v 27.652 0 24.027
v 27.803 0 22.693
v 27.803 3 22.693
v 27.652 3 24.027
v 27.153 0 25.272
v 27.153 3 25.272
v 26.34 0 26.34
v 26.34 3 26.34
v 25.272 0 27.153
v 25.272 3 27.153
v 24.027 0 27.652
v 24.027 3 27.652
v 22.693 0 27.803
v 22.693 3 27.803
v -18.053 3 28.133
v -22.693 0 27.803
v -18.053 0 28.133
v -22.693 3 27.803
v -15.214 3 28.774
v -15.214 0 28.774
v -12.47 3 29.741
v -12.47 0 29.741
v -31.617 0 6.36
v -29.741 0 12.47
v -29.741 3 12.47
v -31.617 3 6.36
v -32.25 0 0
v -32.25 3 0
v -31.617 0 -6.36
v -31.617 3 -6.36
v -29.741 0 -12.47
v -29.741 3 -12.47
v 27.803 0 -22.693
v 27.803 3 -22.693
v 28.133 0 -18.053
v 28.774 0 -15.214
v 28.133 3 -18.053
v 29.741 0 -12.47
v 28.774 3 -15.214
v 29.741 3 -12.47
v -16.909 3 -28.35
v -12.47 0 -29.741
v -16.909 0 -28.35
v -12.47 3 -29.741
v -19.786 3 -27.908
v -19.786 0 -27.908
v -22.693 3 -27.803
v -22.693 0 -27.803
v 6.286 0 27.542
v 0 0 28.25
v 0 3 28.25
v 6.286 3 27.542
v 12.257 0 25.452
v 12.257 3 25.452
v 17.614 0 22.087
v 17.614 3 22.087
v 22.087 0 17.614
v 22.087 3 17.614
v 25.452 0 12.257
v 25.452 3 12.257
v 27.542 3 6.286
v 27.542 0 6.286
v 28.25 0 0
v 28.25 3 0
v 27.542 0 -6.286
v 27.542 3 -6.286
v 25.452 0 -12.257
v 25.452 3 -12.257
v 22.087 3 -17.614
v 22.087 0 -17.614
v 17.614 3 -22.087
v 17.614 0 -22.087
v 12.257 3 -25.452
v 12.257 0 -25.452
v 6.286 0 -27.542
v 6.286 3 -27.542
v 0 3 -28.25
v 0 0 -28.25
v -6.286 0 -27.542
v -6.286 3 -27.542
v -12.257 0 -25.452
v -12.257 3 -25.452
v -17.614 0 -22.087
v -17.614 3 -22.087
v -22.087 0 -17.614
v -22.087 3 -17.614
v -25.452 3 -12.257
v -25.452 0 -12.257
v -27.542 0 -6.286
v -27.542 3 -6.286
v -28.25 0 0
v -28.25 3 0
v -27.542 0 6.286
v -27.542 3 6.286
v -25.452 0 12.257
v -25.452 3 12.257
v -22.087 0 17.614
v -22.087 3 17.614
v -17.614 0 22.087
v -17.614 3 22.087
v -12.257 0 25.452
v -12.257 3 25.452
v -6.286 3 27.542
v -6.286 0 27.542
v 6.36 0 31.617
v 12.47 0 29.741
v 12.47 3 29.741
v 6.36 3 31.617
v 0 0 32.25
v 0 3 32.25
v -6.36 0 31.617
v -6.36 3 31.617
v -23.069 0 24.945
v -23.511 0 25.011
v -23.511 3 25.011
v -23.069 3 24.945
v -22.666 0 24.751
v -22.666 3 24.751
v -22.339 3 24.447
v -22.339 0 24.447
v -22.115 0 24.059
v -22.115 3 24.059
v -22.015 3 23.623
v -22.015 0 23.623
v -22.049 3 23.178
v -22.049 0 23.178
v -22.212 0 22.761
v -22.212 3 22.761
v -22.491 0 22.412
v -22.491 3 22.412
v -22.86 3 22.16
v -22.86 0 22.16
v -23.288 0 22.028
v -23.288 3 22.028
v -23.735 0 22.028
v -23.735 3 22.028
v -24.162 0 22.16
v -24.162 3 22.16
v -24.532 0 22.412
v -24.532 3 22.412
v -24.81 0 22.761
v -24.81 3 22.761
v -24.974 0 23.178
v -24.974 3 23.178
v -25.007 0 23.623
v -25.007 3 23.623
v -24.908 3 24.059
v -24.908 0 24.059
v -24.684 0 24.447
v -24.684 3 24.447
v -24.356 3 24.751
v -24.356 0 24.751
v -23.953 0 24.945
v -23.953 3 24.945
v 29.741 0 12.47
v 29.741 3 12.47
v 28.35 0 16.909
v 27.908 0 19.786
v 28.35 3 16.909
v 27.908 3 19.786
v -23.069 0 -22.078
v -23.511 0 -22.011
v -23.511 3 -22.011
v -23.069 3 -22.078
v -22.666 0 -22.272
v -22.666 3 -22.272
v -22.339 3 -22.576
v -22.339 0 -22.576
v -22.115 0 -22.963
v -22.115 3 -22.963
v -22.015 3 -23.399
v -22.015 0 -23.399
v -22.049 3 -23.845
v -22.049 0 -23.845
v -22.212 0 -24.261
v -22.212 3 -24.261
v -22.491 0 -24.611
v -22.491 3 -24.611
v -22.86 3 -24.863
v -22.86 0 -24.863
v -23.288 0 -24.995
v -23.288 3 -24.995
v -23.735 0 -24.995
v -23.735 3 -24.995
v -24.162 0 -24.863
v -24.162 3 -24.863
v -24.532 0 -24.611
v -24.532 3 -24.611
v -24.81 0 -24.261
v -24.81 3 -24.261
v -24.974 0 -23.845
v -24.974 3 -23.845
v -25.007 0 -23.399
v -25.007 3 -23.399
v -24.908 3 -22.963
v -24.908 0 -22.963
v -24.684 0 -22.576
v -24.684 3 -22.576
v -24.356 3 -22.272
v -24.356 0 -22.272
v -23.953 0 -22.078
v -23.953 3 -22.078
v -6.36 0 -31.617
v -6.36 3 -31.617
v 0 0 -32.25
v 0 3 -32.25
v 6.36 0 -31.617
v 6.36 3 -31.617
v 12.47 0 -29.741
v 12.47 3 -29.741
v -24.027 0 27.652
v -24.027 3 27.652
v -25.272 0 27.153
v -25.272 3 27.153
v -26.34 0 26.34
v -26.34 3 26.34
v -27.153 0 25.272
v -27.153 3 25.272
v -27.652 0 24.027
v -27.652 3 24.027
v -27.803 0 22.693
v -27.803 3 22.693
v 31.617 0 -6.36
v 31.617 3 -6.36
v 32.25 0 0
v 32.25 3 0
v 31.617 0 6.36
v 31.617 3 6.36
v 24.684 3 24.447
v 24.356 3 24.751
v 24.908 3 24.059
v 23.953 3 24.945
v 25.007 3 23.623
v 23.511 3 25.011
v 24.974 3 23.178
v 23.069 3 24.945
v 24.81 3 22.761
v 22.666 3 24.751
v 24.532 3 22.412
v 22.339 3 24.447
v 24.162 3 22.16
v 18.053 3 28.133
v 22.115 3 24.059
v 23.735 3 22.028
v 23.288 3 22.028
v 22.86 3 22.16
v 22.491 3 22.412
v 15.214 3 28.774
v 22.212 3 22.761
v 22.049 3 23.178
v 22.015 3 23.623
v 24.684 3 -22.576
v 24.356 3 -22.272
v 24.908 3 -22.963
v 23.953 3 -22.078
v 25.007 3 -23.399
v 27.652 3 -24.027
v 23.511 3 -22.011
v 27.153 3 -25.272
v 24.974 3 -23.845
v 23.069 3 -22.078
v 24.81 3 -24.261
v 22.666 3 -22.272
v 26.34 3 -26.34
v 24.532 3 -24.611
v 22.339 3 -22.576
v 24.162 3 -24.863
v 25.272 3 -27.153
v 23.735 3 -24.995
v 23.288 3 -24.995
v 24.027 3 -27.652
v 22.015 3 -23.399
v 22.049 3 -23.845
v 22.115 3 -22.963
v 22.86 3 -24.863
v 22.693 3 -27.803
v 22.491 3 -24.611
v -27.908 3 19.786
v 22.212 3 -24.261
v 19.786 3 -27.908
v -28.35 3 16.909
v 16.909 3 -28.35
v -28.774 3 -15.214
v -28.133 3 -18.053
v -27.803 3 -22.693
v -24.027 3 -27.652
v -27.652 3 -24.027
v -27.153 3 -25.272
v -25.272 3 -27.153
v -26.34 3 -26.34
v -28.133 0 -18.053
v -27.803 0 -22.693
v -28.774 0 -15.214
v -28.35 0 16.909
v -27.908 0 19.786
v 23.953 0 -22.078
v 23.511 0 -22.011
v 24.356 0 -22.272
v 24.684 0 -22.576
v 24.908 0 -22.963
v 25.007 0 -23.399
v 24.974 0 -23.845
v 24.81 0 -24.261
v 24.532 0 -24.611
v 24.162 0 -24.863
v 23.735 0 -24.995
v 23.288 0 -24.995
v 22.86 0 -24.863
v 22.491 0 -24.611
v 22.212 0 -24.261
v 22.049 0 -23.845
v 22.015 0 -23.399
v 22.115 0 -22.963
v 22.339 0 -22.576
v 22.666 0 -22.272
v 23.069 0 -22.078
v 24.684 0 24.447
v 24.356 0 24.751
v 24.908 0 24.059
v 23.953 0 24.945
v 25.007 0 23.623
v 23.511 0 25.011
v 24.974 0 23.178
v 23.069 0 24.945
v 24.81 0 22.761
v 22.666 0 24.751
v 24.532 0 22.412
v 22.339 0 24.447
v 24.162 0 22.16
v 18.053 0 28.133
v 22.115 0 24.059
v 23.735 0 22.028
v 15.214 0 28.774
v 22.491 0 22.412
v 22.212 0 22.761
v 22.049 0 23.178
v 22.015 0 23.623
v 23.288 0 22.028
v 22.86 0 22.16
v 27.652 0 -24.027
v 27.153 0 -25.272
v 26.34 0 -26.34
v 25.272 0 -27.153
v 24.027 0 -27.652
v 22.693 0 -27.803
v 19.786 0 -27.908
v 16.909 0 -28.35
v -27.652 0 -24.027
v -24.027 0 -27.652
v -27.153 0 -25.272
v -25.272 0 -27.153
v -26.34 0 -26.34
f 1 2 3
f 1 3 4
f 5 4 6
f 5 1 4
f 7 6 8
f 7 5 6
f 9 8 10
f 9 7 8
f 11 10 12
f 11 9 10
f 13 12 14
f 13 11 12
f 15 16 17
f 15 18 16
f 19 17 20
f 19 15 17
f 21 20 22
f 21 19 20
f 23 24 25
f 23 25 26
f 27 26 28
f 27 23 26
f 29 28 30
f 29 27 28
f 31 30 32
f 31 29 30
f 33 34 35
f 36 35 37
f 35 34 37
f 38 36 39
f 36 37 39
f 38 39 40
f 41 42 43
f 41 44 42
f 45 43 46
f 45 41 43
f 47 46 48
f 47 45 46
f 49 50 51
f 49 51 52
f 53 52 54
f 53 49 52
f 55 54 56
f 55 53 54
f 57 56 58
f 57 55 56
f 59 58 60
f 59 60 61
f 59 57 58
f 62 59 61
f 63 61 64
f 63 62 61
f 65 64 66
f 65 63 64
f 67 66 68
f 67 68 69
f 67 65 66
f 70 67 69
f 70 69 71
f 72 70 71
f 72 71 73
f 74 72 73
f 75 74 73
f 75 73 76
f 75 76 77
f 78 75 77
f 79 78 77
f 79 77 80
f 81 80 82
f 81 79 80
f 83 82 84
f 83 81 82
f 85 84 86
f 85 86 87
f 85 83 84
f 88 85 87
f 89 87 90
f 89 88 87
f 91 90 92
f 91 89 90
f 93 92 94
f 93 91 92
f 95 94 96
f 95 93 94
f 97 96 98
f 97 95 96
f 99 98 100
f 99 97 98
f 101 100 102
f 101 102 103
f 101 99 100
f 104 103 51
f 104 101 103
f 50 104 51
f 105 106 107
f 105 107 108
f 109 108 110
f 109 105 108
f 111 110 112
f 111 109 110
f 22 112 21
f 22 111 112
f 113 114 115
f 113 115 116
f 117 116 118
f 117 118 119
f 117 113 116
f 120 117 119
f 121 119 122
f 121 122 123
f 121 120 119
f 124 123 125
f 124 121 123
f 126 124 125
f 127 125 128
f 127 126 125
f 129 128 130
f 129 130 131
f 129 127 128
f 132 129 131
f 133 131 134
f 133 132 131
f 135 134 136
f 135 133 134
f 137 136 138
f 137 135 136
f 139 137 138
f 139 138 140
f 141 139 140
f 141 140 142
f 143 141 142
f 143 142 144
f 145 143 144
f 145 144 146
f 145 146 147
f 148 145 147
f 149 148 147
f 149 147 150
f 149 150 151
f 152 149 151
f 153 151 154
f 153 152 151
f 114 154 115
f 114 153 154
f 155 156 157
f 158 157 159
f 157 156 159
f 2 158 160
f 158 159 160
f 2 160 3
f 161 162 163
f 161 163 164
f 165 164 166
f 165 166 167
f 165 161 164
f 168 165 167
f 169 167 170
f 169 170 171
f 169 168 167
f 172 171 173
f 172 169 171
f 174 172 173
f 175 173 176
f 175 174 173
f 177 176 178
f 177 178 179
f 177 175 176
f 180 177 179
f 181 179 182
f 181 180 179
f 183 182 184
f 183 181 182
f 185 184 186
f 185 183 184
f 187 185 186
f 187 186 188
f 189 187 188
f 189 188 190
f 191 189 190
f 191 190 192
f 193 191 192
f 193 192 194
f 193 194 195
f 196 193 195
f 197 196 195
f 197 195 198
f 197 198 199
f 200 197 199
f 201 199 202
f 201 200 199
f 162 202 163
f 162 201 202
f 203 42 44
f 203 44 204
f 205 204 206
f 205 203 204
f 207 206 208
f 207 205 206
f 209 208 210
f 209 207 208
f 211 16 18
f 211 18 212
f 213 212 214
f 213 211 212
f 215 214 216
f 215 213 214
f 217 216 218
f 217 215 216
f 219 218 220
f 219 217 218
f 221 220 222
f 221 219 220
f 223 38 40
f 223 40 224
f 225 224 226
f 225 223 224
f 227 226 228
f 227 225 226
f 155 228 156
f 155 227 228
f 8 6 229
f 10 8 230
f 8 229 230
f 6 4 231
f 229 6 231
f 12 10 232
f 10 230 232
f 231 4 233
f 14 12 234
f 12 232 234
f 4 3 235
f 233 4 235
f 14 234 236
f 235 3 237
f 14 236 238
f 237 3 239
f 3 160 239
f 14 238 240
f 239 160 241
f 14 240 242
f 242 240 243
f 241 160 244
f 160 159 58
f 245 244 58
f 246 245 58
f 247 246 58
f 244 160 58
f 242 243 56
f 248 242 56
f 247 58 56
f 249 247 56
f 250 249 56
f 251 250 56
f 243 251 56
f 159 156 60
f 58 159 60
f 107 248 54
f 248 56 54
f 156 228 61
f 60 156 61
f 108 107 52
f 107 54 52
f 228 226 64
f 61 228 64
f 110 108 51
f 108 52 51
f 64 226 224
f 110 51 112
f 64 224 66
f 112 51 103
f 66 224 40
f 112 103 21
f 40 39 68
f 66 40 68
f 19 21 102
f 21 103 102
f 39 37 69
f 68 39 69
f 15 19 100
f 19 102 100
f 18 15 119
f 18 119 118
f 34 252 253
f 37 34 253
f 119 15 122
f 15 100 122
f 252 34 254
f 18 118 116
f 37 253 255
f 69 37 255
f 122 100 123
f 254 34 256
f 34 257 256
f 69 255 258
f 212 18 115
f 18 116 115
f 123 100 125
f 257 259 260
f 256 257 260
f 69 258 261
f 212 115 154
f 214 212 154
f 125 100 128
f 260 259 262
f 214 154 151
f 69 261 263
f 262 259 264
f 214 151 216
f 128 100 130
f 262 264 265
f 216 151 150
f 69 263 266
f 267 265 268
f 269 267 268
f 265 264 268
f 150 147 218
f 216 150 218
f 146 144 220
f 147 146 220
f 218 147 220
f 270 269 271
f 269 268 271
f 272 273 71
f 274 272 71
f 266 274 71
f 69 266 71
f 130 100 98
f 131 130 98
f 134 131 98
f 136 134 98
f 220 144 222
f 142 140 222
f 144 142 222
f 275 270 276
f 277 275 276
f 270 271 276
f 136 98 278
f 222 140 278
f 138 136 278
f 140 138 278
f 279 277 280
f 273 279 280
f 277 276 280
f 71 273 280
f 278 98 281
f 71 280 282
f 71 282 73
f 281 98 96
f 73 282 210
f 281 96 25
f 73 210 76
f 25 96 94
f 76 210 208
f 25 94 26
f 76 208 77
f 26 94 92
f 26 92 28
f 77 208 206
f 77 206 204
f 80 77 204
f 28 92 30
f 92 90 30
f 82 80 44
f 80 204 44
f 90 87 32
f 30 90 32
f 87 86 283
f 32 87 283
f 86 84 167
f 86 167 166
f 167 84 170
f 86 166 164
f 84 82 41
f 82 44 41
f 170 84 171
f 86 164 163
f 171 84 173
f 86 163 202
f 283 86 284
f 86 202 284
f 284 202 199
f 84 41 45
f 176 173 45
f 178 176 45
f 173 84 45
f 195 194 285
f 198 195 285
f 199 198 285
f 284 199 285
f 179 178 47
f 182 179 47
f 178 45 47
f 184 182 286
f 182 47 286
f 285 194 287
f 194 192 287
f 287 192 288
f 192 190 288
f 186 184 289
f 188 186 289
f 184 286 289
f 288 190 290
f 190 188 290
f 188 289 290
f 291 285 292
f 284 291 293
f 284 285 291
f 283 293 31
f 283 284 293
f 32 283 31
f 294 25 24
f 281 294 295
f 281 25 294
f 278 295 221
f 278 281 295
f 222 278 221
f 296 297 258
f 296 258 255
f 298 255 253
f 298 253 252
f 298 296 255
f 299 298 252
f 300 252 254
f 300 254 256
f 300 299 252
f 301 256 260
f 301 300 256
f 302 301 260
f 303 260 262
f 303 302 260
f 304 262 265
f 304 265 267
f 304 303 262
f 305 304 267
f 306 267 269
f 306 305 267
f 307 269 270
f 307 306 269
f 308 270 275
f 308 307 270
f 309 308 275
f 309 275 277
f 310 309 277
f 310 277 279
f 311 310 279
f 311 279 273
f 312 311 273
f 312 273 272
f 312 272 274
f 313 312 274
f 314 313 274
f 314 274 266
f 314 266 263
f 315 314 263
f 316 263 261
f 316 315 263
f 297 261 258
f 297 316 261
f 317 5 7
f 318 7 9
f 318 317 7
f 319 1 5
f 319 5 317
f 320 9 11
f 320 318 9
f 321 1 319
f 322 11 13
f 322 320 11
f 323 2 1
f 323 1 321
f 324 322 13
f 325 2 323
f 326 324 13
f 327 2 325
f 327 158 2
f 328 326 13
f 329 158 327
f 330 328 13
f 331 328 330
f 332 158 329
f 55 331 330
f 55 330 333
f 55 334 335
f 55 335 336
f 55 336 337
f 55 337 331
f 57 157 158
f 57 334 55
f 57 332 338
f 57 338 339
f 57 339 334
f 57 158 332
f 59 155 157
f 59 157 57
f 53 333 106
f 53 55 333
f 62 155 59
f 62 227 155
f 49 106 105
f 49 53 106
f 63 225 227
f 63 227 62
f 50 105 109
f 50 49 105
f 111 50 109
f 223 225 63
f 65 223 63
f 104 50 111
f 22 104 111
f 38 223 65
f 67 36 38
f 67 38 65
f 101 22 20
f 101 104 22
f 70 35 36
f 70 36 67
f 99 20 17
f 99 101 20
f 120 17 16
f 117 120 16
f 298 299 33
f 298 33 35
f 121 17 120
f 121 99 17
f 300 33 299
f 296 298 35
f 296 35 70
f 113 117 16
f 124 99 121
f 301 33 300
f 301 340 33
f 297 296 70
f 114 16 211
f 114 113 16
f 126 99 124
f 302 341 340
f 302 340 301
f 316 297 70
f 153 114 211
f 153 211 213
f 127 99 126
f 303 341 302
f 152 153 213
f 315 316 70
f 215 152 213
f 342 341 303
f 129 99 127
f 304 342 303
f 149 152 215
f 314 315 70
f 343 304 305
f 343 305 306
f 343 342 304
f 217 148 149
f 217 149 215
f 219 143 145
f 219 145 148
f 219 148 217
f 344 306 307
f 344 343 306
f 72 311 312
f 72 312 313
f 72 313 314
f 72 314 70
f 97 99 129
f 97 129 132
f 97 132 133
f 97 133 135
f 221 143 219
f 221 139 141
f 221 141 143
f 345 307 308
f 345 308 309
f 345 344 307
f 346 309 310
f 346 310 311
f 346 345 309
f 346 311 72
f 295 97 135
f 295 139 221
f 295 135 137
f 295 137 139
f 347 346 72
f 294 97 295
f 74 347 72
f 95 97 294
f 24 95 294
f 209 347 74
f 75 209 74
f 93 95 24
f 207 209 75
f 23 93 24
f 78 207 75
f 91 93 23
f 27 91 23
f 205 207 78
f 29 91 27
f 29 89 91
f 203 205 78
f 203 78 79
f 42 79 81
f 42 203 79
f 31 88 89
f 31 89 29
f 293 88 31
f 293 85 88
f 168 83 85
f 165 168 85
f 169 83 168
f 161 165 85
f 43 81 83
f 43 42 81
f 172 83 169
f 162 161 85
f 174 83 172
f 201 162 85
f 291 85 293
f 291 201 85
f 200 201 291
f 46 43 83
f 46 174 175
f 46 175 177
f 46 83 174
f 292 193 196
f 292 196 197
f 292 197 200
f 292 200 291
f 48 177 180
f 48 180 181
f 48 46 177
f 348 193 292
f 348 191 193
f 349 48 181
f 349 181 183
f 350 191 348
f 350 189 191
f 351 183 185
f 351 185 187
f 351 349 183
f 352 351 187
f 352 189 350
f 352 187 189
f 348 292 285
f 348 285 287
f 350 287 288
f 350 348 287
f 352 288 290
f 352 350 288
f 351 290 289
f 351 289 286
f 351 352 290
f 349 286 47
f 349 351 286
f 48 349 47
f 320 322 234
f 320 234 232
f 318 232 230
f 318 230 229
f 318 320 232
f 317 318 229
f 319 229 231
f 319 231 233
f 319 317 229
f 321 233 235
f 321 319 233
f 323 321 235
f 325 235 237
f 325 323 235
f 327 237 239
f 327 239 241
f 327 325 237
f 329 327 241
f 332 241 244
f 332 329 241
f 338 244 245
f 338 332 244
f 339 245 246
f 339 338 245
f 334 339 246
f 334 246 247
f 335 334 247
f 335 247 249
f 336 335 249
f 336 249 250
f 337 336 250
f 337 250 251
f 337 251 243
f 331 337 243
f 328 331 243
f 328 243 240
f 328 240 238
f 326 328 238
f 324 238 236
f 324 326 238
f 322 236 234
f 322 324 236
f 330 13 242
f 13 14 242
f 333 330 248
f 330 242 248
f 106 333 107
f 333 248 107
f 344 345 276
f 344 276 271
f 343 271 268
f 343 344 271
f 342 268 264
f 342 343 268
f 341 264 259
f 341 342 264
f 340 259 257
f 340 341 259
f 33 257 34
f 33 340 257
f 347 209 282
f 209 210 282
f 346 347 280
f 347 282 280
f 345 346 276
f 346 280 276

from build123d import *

# Parameters (mm, degrees)
SKETCH1_R           = 28.25
SKETCH1_R_2         = 1.5
BOSS_EXTRUDE1_DEPTH = 3
FILLET1_R           = 25


with BuildPart() as part:
    # Sketch1 → Boss-Extrude1 (new body)
    with BuildSketch(Plane(origin=(0, 0, 0), x_dir=(1, 0, 0), z_dir=(0, 1, 0))):
        with BuildLine():
            ThreePointArc((-19.00522636, 26.055016235), (0, 32.25), (19.00522636, 26.055016235))
            ThreePointArc((19.00522636, 26.055016235), (26.339727599, 26.339727599), (26.055016235, 19.00522636))
            ThreePointArc((26.055016235, 19.00522636), (32.25, 0), (26.055016235, -19.00522636))
            ThreePointArc((26.055016235, -19.00522636), (26.339727599, -26.339727599), (19.00522636, -26.055016235))
            ThreePointArc((19.00522636, -26.055016235), (0, -32.25), (-19.00522636, -26.055016235))
            ThreePointArc((-19.00522636, -26.055016235), (-26.339727599, -26.339727599), (-26.055016235, -19.00522636))
            ThreePointArc((-26.055016235, -19.00522636), (-32.25, 0), (-26.055016235, 19.00522636))
            ThreePointArc((-26.055016235, 19.00522636), (-26.339727599, 26.339727599), (-19.00522636, 26.055016235))
        make_face()
        with Locations(Location((0, 0, 0), (0, 0, 270))):
            Circle(SKETCH1_R, mode=Mode.SUBTRACT)
        with Locations(Location((23.511300474, 23.511300474, 0), (0, 0, 270))):
            Circle(SKETCH1_R_2, mode=Mode.SUBTRACT)
        with Locations(Location((23.511300474, -23.511300474, 0), (0, 0, 270))):
            Circle(SKETCH1_R_2, mode=Mode.SUBTRACT)
        with Locations(Location((-23.511300474, -23.511300474, 0), (0, 0, 270))):
            Circle(SKETCH1_R_2, mode=Mode.SUBTRACT)
        with Locations(Location((-23.511300474, 23.511300474, 0), (0, 0, 270))):
            Circle(SKETCH1_R_2, mode=Mode.SUBTRACT)
    extrude(amount=BOSS_EXTRUDE1_DEPTH)

    # Fillet1
    fillet1_edges = [part.edges().sort_by_distance(p)[0] for p in [
        (-19.00522636, 1.5, -26.055016235),
        (19.00522636, 1.5, -26.055016235),
        (26.055016235, 1.5, -19.00522636),
        (26.055016235, 1.5, 19.00522636),
        (19.00522636, 1.5, 26.055016235),
        (-19.00522636, 1.5, 26.055016235),
        (-26.055016235, 1.5, 19.00522636),
        (-26.055016235, 1.5, -19.00522636),
    ]]
    fillet(fillet1_edges, radius=FILLET1_R)


solid = part.part
